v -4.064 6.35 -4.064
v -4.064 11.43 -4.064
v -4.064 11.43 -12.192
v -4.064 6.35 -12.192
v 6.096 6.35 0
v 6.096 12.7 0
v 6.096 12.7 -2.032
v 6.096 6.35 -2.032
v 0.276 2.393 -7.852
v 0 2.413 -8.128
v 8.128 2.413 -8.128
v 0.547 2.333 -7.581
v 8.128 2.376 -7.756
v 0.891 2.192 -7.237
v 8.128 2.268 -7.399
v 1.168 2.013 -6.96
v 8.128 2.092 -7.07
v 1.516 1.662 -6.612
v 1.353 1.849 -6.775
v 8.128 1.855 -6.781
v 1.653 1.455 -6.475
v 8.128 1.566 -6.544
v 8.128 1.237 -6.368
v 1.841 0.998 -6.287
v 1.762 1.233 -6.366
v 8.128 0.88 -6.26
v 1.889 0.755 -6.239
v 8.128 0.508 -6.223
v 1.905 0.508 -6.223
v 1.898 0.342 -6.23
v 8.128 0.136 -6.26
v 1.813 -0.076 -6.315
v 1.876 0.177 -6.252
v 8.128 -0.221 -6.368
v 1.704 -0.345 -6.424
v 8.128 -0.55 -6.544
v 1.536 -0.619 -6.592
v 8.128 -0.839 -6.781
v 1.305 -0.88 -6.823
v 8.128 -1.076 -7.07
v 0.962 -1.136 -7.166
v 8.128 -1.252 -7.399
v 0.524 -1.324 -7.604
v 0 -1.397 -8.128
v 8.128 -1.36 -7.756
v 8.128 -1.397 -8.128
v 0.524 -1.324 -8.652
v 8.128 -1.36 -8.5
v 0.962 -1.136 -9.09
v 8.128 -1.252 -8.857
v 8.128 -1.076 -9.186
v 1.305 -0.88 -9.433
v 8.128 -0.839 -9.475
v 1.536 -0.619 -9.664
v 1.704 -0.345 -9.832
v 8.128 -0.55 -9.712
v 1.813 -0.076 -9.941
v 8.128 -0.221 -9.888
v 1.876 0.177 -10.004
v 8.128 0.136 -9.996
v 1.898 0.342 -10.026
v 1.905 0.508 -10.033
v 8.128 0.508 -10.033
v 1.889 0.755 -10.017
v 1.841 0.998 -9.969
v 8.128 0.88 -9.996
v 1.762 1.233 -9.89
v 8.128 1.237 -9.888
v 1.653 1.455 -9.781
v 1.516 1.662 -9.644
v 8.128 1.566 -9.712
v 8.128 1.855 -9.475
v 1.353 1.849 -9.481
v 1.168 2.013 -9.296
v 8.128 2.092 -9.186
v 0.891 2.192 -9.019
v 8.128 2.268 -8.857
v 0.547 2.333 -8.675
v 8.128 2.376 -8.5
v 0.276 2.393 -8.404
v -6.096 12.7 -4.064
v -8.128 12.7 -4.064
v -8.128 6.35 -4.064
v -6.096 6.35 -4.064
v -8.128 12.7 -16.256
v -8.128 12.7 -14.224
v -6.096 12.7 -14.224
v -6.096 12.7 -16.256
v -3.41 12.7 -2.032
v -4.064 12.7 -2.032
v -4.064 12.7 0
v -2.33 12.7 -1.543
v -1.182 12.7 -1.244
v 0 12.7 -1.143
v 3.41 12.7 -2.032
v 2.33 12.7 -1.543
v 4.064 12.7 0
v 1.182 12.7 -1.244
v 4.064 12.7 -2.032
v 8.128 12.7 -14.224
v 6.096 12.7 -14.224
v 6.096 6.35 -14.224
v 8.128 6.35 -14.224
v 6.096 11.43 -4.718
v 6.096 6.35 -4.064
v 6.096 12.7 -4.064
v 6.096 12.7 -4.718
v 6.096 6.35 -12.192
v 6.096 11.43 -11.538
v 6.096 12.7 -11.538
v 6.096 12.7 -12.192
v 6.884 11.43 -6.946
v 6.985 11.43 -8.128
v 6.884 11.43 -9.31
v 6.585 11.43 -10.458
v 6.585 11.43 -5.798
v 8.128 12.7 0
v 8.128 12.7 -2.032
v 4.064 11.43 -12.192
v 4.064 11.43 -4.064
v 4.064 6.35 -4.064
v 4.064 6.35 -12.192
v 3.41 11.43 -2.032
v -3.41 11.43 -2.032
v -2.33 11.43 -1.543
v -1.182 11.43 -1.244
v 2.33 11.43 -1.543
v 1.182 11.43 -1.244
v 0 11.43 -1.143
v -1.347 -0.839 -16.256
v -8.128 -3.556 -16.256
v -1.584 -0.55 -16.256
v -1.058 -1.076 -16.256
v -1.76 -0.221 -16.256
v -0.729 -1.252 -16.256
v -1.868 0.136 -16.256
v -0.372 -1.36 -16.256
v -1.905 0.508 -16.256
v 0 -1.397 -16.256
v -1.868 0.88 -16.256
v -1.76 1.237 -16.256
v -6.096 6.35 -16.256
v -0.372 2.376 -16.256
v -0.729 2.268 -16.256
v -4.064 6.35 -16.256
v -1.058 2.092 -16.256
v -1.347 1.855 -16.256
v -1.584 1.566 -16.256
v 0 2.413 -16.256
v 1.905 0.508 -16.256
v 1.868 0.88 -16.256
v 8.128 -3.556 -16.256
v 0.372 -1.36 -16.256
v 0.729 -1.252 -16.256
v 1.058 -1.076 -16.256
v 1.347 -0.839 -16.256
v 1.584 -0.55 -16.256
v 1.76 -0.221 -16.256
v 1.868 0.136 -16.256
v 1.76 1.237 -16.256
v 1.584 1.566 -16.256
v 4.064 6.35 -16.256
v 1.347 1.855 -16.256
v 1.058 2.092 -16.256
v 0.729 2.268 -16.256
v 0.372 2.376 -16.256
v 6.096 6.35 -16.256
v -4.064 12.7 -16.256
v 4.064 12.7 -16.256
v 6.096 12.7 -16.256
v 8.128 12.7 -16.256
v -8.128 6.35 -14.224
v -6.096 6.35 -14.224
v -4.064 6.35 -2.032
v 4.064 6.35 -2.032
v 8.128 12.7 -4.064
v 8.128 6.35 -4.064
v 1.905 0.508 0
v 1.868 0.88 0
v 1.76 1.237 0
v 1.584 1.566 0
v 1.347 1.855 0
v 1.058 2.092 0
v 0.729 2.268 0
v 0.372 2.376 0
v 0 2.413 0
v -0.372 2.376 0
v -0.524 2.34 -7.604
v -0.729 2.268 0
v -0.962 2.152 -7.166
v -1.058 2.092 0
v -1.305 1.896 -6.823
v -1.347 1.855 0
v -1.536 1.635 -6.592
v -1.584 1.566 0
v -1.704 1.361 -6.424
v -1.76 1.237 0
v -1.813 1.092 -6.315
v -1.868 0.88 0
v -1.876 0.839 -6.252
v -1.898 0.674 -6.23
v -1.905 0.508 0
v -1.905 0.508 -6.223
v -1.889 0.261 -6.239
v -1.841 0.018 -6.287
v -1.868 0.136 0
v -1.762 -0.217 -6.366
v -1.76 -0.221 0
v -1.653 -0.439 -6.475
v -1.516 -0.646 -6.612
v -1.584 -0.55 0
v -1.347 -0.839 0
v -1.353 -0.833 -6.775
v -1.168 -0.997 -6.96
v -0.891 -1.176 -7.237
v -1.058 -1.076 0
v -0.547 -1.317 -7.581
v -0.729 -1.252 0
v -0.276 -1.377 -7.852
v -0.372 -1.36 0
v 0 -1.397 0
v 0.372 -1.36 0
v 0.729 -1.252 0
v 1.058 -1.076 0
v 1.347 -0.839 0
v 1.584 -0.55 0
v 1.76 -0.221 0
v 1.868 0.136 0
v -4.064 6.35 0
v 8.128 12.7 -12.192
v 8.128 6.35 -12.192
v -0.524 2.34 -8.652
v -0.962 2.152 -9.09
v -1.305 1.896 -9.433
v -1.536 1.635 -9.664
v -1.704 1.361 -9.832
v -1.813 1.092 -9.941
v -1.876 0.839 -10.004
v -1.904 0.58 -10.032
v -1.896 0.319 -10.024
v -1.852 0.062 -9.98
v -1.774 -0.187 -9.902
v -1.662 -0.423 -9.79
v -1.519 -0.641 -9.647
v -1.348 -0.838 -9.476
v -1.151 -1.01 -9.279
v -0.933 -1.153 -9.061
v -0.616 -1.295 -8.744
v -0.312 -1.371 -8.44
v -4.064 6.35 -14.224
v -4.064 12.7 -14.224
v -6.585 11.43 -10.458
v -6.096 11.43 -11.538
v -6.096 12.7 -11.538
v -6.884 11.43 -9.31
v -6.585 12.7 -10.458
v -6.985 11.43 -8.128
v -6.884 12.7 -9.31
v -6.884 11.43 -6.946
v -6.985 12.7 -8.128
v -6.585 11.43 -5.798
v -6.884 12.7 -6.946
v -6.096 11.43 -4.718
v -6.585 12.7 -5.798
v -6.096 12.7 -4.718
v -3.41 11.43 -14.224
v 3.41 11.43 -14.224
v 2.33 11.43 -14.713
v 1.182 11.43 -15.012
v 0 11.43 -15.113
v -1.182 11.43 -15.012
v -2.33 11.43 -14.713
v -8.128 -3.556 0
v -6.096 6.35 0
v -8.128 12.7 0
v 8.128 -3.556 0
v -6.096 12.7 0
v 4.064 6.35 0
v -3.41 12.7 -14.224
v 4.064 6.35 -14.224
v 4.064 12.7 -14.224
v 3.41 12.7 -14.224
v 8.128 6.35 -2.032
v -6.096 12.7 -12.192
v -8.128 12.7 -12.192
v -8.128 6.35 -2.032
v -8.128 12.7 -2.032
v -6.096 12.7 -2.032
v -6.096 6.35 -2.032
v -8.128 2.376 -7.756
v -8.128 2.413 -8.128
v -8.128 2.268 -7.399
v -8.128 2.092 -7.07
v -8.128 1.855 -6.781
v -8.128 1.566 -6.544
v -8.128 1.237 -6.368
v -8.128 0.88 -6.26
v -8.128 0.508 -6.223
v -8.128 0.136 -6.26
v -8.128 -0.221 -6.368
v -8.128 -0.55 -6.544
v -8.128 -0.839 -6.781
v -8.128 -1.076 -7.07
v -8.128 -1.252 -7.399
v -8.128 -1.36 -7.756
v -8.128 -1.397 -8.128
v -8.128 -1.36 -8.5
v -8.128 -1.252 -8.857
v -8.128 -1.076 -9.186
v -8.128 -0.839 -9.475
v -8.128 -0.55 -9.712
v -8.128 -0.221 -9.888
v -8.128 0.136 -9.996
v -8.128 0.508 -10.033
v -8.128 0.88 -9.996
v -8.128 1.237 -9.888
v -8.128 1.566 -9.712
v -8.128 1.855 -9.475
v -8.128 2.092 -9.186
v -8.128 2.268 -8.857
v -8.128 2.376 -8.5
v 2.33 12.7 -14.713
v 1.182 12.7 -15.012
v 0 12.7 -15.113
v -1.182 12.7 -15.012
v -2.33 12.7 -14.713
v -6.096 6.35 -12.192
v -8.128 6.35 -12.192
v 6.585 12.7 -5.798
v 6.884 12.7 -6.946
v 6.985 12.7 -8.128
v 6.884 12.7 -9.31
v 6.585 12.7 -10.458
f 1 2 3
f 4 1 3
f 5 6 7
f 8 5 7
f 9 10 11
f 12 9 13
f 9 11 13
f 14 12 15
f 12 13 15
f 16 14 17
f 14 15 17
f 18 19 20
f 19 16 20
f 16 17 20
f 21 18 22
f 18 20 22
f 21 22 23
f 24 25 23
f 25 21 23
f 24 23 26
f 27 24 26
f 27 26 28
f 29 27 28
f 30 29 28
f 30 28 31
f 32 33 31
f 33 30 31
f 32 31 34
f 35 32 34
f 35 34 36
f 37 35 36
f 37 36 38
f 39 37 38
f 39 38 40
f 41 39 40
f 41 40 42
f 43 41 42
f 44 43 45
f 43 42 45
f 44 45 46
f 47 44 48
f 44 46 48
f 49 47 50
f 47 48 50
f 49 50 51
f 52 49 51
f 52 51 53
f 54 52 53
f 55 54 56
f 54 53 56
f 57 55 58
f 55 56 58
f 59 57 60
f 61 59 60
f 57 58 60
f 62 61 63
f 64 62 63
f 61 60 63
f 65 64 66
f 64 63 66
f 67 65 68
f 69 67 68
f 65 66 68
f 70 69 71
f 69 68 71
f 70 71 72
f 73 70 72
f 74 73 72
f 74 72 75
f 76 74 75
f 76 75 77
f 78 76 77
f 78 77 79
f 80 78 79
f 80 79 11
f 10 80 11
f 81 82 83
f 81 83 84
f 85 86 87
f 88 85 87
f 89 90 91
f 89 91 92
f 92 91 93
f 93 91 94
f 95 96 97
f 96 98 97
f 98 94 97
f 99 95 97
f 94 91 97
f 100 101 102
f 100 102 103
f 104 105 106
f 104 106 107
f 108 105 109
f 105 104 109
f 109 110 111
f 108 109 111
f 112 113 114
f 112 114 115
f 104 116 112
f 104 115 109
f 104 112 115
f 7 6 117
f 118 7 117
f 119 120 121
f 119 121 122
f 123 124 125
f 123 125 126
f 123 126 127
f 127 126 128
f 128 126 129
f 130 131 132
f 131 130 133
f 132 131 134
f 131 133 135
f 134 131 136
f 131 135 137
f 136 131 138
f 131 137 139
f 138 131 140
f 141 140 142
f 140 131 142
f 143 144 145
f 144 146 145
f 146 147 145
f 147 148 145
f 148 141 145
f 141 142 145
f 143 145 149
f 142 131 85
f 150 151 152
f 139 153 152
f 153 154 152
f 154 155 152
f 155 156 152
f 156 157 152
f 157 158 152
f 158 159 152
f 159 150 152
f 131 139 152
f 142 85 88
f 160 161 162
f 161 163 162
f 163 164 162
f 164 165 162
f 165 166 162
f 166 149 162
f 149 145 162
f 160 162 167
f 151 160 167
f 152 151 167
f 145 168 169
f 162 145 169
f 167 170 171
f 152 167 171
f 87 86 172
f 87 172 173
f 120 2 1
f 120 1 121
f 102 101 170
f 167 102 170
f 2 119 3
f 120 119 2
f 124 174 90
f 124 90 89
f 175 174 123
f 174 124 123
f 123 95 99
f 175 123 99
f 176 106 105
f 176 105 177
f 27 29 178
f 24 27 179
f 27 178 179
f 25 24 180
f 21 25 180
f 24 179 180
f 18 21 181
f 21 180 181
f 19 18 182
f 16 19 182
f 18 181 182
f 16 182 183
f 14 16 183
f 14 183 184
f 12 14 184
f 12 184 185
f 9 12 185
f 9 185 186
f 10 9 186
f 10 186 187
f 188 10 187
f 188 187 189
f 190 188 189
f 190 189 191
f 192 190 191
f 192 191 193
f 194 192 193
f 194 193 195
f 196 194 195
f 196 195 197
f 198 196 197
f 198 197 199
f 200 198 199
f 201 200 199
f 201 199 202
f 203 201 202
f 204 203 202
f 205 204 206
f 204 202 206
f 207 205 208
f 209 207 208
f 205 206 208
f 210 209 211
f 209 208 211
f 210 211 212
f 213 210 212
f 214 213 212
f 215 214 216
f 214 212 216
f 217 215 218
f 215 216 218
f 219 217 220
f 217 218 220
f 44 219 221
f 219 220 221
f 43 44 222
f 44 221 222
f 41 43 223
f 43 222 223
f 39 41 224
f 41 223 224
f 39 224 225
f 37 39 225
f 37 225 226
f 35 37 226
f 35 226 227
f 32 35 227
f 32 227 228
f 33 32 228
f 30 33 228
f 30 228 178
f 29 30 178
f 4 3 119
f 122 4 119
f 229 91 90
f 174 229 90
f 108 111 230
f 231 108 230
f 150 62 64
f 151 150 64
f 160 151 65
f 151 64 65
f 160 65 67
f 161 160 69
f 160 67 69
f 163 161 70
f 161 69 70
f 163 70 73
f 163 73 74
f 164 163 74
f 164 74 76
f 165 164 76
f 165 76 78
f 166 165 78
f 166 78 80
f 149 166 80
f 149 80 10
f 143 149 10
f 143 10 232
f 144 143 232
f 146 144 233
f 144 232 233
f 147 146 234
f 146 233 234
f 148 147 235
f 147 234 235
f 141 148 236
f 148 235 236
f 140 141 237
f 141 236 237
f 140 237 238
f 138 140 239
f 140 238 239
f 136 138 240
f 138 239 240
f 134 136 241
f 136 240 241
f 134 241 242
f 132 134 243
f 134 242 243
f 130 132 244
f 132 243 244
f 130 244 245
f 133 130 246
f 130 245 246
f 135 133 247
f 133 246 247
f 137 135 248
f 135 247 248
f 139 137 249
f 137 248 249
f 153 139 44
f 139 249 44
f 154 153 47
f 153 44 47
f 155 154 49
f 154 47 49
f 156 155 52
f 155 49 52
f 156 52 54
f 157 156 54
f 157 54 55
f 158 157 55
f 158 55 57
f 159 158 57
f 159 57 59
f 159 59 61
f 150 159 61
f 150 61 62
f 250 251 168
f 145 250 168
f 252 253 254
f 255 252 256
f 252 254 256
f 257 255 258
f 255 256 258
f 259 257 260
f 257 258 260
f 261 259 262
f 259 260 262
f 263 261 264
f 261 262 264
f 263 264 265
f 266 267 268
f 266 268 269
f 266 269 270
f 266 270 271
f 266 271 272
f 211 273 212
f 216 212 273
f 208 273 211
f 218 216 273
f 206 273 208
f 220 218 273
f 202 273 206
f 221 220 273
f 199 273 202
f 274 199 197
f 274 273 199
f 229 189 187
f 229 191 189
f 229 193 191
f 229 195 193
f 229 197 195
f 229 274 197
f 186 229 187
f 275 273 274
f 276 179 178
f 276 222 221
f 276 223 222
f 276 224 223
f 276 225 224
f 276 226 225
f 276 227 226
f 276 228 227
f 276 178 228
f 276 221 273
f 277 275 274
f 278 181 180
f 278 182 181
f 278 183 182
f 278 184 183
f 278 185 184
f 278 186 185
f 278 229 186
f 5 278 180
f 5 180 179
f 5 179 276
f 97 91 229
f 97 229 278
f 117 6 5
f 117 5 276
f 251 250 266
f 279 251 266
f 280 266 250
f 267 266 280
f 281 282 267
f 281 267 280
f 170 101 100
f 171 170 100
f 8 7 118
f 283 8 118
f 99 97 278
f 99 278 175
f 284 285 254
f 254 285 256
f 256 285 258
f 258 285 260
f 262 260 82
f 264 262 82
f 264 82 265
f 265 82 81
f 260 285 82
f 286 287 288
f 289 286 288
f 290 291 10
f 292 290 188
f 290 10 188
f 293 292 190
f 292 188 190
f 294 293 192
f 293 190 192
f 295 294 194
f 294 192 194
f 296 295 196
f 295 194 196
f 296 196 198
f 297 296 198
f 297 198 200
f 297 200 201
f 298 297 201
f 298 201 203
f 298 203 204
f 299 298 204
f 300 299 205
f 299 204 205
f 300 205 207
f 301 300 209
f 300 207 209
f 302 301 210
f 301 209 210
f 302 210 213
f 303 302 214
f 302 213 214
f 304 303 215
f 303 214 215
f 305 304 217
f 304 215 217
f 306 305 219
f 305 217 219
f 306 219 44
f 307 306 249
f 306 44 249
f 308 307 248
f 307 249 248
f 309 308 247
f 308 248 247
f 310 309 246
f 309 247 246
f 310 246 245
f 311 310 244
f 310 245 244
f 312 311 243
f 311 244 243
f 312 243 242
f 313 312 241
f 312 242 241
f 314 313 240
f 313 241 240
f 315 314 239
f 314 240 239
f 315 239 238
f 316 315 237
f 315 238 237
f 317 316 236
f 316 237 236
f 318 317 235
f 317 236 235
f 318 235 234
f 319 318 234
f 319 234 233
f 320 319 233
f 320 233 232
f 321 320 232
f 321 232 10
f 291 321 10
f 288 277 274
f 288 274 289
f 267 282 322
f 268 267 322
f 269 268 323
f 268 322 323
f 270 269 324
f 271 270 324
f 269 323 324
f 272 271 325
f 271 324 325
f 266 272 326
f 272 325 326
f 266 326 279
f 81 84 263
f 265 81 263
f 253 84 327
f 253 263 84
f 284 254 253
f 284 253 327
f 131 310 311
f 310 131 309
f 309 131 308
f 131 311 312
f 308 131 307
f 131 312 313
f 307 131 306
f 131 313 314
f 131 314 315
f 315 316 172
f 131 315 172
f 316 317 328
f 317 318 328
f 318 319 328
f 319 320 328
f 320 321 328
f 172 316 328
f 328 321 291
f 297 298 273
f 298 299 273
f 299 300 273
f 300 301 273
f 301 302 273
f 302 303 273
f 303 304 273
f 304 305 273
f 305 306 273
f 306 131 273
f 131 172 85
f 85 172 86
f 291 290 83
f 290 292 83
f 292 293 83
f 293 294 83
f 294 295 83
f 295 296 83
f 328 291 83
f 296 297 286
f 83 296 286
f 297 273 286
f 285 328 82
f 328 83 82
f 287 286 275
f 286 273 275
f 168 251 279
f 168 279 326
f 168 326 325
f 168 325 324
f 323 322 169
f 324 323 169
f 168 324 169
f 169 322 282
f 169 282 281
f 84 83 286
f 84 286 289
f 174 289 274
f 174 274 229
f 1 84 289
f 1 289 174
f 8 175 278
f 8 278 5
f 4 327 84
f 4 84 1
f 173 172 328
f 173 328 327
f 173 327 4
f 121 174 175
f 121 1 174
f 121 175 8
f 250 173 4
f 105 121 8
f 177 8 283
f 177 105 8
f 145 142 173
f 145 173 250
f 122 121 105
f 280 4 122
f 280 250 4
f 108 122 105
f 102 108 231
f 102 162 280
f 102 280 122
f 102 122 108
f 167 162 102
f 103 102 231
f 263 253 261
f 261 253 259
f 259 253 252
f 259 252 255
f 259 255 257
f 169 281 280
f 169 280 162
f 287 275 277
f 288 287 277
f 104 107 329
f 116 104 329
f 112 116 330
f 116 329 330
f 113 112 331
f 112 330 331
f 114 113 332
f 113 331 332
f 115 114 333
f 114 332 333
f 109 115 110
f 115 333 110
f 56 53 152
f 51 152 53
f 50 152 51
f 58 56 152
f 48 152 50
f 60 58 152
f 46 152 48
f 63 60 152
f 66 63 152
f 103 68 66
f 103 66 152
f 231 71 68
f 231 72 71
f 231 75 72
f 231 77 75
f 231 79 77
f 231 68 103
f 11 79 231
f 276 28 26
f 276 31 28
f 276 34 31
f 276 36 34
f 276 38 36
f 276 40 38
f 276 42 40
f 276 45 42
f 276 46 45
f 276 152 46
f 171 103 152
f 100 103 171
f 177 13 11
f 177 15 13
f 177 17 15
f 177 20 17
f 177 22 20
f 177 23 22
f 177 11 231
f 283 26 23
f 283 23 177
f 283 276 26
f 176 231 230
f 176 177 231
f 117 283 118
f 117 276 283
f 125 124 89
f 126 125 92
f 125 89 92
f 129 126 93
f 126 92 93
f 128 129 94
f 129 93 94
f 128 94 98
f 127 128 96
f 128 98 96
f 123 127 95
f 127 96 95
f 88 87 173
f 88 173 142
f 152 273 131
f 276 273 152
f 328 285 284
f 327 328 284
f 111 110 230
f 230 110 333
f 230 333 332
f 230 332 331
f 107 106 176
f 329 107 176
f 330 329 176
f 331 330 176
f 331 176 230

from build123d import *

# Parameters (mm, degrees)
SKETCH2_W           = 16.256
SKETCH2_H           = 16.256
BOSS_EXTRUDE1_DEPTH = 16.256
SKETCH3_R           = 6.985
CUT_EXTRUDE1_DEPTH  = 1.27
SKETCH4_W           = 2.032
SKETCH4_H           = 16.256
SKETCH4_W_2         = 16.256
SKETCH4_H_2         = 2.032
CUT_EXTRUDE3_DEPTH  = 6.35
SKETCH7_R           = 1.905
CUT_EXTRUDE5_DEPTH  = 23.172323288
SKETCH8_R           = 1.905
CUT_EXTRUDE6_DEPTH  = 27.26414042


with BuildPart() as part:
    # Sketch2 → Boss-Extrude1 (new body)
    with BuildSketch(Plane.XY):
        with Locations((0, 4.572)):
            Rectangle(SKETCH2_W, SKETCH2_H)
    extrude(amount=-BOSS_EXTRUDE1_DEPTH)

    # Sketch3 → Cut-Extrude1 (cut)
    with BuildSketch(Plane(origin=(0, 12.7, 0), x_dir=(1, 0, 0), z_dir=(0, 1, 0))):
        with Locations(Location((0, 8.128, 0), (0, 0, 270))):
            Circle(SKETCH3_R)
    extrude(amount=-CUT_EXTRUDE1_DEPTH, mode=Mode.SUBTRACT)

    # Sketch4 → Cut-Extrude3 (cut)
    with BuildSketch(Plane(origin=(0, 12.7, 0), x_dir=(1, 0, 0), z_dir=(0, 1, 0))):
        with Locations((-5.08, 8.128)):
            Rectangle(SKETCH4_W, SKETCH4_H)
        with Locations((5.08, 8.128)):
            Rectangle(SKETCH4_W, SKETCH4_H)
        with Locations((0, 13.208)):
            Rectangle(SKETCH4_W_2, SKETCH4_H_2)
        with Locations((0, 3.048)):
            Rectangle(SKETCH4_W_2, SKETCH4_H_2)
    extrude(amount=-CUT_EXTRUDE3_DEPTH, mode=Mode.SUBTRACT)

    # Sketch7 → Cut-Extrude5 (cut, through all)
    with BuildSketch(Plane.XY):
        with Locations((0, 0.508)):
            Circle(SKETCH7_R)
    extrude(amount=-CUT_EXTRUDE5_DEPTH, mode=Mode.SUBTRACT)

    # Sketch8 → Cut-Extrude6 (cut, through all)
    with BuildSketch(Plane(origin=(8.128, 0, 0), x_dir=(0, 0, -1), z_dir=(1, 0, 0))):
        with Locations(Location((8.128, 0.508, 0), (0, 0, 90))):
            Circle(SKETCH8_R)
    extrude(amount=-CUT_EXTRUDE6_DEPTH, mode=Mode.SUBTRACT)


solid = part.part
